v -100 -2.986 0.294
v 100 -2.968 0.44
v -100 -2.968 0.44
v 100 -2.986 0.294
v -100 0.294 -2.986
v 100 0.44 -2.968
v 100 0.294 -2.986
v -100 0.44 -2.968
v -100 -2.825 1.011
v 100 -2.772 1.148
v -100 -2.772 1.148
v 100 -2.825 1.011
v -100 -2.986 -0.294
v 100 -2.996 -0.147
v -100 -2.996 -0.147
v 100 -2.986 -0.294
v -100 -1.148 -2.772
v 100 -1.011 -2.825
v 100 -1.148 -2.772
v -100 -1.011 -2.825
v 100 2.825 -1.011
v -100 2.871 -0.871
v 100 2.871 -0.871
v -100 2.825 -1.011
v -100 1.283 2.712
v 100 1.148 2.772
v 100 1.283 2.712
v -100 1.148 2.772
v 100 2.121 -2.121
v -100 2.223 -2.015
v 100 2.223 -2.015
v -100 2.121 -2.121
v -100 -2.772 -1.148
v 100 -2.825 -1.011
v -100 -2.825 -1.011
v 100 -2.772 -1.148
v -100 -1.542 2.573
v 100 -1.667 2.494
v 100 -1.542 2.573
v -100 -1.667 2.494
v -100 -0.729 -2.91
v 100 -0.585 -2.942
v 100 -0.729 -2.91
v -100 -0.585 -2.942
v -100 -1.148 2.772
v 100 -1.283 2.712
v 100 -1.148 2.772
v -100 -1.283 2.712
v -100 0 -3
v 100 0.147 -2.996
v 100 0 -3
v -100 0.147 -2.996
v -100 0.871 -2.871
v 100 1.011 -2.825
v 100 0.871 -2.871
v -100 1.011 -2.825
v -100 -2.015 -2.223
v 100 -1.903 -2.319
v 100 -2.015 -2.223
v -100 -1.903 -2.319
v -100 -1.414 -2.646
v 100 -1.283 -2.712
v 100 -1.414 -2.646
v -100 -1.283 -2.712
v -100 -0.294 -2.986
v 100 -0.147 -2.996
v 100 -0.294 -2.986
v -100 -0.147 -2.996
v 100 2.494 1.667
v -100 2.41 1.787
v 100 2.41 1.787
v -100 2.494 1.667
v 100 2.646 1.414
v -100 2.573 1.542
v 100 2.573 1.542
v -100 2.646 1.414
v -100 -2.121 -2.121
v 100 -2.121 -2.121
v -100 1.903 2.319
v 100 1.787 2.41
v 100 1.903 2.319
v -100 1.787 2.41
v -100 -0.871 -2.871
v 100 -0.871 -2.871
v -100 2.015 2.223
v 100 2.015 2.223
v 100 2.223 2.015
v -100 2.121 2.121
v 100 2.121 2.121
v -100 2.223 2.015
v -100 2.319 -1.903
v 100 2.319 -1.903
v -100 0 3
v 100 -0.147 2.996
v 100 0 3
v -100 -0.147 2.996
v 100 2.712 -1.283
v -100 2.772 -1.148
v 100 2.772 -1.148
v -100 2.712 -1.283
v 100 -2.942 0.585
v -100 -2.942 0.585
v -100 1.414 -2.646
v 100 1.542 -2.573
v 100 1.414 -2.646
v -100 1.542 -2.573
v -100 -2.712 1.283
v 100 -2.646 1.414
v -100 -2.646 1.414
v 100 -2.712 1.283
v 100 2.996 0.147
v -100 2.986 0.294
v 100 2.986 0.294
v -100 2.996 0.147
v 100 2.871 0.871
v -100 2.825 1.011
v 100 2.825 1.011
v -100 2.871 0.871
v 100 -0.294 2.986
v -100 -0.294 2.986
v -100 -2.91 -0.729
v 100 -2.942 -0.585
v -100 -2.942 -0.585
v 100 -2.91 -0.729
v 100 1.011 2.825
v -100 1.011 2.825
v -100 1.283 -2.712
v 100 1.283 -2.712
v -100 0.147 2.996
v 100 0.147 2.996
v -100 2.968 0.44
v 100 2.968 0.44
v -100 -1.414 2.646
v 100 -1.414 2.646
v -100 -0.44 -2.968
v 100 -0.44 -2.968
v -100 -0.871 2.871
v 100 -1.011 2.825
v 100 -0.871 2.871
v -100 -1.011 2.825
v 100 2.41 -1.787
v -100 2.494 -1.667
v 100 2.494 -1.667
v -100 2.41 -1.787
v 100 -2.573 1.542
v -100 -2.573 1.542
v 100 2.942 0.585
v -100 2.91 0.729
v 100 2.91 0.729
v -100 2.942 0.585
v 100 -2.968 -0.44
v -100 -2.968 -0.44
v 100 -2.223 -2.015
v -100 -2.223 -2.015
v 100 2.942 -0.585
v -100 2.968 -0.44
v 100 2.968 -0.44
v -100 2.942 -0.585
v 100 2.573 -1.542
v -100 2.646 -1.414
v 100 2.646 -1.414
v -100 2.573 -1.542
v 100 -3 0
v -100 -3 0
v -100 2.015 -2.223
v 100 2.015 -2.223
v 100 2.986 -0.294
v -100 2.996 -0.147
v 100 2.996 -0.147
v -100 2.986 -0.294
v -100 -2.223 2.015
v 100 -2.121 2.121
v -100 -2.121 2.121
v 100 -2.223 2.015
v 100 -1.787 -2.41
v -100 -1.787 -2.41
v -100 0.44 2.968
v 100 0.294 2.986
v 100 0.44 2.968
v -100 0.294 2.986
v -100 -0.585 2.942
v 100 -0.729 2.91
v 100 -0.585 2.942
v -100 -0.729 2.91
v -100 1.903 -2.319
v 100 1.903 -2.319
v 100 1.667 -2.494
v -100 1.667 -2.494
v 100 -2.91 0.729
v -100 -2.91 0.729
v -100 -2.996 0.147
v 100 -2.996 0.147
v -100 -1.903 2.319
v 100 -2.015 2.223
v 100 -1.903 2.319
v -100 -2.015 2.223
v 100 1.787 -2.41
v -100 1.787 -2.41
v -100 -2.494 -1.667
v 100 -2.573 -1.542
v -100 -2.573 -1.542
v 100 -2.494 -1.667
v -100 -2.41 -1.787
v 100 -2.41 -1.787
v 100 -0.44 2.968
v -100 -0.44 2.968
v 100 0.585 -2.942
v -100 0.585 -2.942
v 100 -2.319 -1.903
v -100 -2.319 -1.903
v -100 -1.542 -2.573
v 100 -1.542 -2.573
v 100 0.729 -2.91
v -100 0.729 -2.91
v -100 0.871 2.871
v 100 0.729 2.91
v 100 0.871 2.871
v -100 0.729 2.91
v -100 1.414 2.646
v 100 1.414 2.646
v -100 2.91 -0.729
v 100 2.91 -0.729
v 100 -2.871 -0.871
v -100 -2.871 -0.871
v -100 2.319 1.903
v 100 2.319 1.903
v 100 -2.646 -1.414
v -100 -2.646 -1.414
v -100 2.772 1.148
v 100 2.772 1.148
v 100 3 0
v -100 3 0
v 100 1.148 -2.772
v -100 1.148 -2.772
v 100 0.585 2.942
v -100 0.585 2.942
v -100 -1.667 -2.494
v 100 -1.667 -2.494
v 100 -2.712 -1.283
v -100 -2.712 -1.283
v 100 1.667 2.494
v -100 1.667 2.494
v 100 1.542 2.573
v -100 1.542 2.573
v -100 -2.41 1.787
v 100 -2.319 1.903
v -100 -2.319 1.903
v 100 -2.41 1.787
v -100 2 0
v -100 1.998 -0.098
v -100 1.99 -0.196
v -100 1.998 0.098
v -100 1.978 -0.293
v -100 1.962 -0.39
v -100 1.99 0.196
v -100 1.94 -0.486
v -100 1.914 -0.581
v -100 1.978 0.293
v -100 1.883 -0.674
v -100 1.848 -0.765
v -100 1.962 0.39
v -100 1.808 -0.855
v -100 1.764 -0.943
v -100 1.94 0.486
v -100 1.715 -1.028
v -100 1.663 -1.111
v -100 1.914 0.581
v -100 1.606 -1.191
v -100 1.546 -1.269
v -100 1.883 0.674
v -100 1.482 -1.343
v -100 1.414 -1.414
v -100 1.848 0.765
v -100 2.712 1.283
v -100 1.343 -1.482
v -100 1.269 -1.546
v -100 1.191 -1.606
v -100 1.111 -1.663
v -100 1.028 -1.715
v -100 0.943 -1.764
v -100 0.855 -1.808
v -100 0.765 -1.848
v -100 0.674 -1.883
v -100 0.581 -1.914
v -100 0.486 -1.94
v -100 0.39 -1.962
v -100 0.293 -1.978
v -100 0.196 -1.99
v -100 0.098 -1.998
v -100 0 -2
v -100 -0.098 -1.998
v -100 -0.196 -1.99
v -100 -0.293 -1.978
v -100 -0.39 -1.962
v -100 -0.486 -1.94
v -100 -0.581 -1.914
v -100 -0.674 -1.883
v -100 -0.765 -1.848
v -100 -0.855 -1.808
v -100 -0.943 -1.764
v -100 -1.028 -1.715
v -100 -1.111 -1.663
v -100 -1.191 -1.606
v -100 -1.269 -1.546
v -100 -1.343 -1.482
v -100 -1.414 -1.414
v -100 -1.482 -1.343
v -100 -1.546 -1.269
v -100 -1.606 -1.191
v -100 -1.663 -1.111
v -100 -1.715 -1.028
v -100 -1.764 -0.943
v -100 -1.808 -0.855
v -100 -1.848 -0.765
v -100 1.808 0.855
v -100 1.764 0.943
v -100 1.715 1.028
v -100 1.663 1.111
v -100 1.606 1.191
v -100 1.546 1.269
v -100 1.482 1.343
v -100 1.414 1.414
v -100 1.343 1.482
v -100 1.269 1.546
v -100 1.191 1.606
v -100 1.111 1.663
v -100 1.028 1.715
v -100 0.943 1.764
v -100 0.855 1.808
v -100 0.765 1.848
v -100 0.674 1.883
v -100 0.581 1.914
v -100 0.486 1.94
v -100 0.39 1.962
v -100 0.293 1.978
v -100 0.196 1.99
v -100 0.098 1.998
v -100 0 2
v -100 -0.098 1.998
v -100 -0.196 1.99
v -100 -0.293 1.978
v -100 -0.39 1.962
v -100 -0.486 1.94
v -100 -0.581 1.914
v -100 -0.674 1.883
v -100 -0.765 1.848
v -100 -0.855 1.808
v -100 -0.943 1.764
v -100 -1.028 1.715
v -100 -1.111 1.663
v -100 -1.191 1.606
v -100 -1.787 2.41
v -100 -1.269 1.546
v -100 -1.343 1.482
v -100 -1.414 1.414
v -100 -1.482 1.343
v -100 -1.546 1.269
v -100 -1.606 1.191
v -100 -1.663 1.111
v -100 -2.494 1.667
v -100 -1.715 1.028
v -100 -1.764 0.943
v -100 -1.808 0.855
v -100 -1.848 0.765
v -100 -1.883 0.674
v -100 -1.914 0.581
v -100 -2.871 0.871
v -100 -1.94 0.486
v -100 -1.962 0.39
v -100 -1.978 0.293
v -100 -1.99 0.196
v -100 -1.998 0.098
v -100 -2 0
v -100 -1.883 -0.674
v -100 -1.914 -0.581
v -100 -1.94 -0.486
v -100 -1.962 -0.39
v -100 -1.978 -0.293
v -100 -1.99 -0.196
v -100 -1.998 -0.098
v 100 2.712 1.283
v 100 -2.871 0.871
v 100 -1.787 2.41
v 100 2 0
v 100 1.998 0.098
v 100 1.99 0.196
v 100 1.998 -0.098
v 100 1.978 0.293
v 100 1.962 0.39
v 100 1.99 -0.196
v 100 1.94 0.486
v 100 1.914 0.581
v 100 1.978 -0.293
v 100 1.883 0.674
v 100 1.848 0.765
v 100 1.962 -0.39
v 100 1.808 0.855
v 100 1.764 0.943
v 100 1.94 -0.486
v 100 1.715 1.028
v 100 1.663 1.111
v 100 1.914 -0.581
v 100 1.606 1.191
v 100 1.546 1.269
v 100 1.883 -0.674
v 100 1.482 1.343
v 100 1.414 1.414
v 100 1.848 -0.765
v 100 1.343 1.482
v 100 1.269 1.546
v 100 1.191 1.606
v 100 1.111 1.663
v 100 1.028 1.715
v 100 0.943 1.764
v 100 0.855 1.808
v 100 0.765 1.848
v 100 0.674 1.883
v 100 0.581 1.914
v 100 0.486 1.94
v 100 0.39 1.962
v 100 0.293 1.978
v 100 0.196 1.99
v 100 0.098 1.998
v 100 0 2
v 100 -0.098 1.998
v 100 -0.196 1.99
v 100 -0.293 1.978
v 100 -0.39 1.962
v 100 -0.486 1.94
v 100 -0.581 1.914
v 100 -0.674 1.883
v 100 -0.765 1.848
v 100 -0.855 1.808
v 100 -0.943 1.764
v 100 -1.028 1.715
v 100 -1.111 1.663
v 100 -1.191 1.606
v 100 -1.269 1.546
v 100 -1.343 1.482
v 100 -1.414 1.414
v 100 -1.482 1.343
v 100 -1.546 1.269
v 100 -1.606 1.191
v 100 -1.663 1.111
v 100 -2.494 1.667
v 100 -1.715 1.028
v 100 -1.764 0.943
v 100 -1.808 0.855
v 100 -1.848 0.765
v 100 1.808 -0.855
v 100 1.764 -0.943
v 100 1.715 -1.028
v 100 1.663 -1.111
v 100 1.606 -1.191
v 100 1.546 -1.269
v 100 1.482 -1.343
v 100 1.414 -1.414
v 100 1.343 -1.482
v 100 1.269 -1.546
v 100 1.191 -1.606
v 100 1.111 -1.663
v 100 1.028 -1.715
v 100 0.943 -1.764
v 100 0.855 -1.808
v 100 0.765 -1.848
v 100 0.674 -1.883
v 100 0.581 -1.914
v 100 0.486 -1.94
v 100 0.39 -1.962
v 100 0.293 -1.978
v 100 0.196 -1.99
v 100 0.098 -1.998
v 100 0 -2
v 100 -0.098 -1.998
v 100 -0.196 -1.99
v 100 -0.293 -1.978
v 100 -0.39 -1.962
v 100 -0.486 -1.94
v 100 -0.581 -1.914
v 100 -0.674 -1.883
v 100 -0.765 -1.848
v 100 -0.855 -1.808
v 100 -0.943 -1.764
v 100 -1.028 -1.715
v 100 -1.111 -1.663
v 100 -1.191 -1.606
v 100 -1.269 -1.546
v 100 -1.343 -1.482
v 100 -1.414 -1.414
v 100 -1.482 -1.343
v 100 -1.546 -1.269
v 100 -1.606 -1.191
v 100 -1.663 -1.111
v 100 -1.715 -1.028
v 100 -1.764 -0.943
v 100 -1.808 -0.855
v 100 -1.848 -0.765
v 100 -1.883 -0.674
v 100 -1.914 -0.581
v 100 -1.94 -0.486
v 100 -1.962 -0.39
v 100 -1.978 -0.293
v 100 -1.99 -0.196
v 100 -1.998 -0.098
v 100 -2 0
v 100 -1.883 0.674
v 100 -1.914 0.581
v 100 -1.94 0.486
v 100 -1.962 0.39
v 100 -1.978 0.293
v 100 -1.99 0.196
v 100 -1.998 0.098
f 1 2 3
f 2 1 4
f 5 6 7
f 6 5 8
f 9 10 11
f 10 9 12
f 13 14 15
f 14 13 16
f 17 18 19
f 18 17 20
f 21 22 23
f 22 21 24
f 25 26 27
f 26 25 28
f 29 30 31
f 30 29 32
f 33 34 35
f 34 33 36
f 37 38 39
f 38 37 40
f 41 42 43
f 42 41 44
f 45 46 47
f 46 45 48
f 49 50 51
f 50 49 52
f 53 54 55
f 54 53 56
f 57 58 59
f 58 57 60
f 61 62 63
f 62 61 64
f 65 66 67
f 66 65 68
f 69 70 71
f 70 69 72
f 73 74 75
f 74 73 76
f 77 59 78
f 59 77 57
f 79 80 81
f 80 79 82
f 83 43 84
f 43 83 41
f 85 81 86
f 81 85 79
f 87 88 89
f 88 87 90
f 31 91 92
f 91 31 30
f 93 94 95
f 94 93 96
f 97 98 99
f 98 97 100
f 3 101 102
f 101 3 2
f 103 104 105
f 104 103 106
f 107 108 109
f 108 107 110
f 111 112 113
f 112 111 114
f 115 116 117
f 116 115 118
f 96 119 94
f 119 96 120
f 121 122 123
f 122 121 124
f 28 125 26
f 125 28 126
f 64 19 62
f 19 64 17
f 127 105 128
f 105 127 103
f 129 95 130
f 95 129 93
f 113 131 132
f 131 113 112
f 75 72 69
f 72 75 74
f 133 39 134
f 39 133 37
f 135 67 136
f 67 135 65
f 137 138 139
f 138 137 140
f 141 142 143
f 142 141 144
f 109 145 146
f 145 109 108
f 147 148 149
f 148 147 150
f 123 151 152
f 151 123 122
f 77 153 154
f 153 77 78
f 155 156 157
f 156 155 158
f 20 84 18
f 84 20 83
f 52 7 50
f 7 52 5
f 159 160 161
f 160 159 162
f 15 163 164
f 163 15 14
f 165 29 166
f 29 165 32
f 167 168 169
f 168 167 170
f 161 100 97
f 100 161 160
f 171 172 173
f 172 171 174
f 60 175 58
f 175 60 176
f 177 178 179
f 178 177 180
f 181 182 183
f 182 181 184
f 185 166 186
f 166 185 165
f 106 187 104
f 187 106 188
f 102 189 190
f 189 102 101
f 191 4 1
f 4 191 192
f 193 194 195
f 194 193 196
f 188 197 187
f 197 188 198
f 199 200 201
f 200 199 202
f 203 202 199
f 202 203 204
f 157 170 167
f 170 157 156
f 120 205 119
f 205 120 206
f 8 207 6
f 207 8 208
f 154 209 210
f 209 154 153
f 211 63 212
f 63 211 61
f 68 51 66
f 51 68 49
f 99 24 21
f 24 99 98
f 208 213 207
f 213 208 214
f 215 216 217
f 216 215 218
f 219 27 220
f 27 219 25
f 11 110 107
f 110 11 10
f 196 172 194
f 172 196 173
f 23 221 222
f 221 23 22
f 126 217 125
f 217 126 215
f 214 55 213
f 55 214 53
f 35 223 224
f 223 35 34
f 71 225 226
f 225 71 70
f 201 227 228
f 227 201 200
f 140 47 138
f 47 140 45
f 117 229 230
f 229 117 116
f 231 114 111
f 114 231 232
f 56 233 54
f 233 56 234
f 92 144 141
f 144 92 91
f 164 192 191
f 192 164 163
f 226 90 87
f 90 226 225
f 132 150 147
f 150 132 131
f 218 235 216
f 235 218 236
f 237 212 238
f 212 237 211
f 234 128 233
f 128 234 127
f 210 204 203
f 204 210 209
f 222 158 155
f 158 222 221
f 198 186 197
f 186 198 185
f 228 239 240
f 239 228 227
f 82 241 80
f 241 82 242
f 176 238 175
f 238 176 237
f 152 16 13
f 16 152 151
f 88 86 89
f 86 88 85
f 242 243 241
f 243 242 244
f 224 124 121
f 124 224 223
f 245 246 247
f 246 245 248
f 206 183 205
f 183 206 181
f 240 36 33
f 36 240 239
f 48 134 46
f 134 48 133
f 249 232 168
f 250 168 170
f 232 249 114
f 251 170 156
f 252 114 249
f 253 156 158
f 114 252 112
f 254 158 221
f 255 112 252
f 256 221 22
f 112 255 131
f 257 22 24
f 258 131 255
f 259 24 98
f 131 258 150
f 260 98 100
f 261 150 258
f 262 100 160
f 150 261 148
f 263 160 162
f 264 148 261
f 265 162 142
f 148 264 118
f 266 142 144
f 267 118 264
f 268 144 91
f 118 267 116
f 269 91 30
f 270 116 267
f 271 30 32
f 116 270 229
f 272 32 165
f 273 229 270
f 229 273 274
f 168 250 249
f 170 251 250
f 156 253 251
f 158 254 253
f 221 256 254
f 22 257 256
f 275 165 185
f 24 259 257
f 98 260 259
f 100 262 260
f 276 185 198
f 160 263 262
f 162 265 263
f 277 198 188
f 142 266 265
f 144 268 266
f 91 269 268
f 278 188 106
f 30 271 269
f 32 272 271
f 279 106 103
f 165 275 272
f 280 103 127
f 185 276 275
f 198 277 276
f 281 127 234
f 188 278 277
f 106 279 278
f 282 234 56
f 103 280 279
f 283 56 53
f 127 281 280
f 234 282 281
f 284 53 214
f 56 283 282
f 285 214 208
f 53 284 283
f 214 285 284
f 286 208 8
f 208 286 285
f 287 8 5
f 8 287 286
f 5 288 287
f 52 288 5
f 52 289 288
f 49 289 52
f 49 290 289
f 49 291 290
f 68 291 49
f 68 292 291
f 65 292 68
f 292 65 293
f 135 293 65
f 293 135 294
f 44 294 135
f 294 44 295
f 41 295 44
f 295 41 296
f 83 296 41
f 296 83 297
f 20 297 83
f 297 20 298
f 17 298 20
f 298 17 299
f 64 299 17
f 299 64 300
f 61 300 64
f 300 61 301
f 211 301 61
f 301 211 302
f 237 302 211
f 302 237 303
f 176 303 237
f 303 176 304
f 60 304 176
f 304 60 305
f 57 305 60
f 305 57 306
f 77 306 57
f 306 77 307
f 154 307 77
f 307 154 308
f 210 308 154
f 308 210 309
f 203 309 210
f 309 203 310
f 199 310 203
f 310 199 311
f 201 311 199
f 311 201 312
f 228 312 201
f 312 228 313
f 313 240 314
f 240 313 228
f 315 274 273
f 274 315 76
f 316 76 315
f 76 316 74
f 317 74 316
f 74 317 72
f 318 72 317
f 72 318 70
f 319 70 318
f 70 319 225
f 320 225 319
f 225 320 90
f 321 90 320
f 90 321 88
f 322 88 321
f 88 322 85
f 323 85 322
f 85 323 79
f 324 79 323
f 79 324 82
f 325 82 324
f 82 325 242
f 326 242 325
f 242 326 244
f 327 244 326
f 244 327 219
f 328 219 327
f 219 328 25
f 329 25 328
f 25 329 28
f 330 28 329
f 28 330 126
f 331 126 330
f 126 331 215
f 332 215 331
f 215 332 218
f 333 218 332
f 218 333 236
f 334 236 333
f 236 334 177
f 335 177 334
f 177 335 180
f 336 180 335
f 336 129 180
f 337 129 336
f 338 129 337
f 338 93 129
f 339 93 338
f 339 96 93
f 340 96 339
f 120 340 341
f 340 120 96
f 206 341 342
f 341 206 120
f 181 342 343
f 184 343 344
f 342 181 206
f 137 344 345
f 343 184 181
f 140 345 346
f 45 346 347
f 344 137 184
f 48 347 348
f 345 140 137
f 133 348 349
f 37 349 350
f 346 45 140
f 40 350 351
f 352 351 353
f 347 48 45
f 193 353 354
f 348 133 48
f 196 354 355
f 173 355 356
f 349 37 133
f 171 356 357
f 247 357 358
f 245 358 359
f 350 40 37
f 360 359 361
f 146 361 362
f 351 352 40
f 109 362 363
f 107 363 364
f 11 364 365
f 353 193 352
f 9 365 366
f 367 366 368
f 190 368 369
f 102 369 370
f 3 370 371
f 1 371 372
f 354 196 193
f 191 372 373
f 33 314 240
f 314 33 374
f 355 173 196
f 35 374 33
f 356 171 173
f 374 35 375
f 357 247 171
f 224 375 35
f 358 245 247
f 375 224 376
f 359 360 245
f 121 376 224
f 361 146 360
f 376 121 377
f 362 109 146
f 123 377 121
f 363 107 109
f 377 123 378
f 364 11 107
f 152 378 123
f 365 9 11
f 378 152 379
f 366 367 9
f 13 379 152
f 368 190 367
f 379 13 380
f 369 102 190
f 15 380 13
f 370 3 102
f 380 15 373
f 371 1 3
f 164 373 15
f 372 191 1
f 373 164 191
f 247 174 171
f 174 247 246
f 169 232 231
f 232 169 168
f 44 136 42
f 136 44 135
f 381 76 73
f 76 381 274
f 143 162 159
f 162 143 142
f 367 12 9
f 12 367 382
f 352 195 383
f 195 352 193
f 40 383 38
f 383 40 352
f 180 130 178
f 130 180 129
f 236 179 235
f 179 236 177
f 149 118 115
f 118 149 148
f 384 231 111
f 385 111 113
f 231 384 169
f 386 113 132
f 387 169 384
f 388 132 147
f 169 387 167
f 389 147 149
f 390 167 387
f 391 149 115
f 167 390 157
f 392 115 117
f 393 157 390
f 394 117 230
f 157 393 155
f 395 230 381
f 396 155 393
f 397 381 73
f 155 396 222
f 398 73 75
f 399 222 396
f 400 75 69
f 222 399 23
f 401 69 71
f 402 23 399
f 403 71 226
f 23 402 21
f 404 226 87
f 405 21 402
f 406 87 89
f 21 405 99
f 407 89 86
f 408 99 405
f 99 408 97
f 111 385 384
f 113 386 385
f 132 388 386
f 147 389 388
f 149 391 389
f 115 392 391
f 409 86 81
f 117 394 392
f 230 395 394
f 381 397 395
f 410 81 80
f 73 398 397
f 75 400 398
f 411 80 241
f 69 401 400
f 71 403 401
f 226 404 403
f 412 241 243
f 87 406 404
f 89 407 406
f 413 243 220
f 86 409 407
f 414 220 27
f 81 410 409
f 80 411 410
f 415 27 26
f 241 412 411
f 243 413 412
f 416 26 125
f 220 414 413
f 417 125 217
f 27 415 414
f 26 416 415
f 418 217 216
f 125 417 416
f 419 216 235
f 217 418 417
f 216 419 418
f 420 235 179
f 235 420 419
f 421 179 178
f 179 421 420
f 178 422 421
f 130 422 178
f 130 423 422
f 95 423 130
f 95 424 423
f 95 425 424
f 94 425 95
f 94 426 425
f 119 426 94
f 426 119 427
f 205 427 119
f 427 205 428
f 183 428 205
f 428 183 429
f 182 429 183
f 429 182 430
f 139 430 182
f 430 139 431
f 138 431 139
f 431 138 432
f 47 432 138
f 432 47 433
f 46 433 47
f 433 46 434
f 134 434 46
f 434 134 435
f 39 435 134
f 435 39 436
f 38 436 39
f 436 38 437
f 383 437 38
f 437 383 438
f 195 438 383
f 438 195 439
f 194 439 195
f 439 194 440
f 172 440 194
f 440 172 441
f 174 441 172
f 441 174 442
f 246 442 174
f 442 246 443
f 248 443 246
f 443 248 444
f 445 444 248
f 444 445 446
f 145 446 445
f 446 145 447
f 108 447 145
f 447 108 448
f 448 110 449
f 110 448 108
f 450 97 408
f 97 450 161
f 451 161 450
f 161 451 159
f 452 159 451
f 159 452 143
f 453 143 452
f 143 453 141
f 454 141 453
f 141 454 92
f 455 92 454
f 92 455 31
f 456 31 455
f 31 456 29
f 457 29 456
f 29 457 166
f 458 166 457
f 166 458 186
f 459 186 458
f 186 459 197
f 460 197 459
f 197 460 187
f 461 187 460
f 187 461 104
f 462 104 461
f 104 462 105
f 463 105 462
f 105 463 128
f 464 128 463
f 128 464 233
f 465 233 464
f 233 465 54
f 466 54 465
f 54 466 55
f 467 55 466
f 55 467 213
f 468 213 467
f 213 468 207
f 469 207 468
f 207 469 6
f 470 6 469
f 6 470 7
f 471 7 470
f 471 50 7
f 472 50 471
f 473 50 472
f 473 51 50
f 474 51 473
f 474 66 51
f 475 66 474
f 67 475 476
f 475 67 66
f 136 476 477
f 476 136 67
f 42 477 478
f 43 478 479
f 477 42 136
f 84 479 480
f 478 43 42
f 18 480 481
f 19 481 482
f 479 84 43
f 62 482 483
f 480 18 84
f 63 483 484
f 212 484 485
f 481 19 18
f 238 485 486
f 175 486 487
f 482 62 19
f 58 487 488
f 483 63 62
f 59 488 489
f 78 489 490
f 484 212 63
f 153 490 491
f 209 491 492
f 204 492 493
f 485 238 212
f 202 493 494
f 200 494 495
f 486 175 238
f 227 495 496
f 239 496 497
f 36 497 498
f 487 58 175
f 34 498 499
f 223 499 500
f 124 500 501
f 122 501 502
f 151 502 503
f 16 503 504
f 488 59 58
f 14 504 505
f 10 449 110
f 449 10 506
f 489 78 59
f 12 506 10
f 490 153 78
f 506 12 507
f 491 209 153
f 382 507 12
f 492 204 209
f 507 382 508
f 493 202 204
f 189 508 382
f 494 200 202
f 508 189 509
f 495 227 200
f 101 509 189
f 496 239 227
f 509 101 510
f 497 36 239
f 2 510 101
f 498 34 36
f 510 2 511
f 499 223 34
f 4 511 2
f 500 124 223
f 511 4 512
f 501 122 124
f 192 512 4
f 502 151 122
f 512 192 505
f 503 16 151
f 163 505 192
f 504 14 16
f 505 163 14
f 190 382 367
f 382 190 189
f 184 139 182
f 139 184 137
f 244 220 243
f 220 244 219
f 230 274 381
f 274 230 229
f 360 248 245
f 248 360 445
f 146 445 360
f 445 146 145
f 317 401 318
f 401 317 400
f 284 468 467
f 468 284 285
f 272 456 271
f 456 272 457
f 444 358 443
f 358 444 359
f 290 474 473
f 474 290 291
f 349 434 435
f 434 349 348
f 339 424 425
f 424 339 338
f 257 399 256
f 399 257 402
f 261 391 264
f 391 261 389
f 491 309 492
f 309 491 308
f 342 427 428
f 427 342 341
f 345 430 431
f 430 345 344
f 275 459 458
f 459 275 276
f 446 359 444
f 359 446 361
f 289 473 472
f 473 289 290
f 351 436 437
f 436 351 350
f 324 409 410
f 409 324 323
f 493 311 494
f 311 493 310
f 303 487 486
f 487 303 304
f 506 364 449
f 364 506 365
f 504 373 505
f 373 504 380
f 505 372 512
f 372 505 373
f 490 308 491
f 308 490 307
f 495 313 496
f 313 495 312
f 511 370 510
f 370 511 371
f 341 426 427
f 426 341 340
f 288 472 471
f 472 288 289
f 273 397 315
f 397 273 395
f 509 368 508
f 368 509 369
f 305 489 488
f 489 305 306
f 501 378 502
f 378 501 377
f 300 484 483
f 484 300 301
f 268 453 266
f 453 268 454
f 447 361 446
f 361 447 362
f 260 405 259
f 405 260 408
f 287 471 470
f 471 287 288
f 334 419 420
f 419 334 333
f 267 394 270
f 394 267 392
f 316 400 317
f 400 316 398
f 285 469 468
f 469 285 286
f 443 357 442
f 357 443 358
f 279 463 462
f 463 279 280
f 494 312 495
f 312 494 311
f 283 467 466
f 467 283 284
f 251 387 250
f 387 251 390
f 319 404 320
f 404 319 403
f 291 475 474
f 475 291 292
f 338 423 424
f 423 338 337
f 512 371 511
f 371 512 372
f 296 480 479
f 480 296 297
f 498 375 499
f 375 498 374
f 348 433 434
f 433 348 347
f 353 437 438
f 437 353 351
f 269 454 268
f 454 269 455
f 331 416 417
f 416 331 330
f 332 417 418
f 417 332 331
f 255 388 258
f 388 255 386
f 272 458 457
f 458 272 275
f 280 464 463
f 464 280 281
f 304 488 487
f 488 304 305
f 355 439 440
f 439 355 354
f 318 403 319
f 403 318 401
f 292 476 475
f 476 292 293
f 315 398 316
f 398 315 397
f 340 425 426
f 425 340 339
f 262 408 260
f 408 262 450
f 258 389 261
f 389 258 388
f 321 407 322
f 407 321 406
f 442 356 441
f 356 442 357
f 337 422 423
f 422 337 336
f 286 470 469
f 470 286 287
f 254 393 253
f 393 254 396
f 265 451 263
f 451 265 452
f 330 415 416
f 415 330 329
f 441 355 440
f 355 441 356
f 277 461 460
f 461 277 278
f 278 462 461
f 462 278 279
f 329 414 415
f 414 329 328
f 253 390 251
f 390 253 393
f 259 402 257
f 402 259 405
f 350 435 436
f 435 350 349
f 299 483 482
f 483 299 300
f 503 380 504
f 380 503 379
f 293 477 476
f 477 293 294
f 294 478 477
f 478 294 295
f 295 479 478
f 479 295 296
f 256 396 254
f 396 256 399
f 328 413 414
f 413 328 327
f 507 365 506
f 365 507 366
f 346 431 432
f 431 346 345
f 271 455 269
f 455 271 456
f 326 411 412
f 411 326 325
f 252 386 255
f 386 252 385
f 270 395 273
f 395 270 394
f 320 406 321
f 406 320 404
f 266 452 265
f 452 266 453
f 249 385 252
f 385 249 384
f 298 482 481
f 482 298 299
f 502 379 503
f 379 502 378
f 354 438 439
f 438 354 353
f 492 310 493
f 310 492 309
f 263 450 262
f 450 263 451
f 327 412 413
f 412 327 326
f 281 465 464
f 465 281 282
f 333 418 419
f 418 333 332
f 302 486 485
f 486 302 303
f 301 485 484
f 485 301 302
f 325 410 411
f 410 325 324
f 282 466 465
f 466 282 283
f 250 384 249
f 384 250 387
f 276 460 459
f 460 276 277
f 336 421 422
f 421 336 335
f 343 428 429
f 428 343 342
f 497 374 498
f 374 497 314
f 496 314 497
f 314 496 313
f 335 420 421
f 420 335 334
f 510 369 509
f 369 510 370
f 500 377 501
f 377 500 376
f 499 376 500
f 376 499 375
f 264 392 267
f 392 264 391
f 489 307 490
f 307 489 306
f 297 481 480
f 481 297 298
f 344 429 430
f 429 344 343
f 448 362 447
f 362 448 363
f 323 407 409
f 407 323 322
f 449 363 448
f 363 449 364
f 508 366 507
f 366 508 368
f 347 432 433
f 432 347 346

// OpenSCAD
$fn = 128;

// PVC aquarium tubing (hollow flexible tube)
// Make it readable in all orthographic views by orienting the tube along X (not Z).
inner_d = 4;      // mm
outer_d = 6;      // mm
length  = 200;    // mm

module tubing(od, id, len) {
    difference() {
        // Outer tube along X axis
        rotate([0, 90, 0])
            cylinder(h = len, d = od, center = true);

        // Inner bore (slightly longer to ensure clean subtraction)
        rotate([0, 90, 0])
            cylinder(h = len + 1, d = id, center = true);
    }
}

tubing(outer_d, inner_d, length);
